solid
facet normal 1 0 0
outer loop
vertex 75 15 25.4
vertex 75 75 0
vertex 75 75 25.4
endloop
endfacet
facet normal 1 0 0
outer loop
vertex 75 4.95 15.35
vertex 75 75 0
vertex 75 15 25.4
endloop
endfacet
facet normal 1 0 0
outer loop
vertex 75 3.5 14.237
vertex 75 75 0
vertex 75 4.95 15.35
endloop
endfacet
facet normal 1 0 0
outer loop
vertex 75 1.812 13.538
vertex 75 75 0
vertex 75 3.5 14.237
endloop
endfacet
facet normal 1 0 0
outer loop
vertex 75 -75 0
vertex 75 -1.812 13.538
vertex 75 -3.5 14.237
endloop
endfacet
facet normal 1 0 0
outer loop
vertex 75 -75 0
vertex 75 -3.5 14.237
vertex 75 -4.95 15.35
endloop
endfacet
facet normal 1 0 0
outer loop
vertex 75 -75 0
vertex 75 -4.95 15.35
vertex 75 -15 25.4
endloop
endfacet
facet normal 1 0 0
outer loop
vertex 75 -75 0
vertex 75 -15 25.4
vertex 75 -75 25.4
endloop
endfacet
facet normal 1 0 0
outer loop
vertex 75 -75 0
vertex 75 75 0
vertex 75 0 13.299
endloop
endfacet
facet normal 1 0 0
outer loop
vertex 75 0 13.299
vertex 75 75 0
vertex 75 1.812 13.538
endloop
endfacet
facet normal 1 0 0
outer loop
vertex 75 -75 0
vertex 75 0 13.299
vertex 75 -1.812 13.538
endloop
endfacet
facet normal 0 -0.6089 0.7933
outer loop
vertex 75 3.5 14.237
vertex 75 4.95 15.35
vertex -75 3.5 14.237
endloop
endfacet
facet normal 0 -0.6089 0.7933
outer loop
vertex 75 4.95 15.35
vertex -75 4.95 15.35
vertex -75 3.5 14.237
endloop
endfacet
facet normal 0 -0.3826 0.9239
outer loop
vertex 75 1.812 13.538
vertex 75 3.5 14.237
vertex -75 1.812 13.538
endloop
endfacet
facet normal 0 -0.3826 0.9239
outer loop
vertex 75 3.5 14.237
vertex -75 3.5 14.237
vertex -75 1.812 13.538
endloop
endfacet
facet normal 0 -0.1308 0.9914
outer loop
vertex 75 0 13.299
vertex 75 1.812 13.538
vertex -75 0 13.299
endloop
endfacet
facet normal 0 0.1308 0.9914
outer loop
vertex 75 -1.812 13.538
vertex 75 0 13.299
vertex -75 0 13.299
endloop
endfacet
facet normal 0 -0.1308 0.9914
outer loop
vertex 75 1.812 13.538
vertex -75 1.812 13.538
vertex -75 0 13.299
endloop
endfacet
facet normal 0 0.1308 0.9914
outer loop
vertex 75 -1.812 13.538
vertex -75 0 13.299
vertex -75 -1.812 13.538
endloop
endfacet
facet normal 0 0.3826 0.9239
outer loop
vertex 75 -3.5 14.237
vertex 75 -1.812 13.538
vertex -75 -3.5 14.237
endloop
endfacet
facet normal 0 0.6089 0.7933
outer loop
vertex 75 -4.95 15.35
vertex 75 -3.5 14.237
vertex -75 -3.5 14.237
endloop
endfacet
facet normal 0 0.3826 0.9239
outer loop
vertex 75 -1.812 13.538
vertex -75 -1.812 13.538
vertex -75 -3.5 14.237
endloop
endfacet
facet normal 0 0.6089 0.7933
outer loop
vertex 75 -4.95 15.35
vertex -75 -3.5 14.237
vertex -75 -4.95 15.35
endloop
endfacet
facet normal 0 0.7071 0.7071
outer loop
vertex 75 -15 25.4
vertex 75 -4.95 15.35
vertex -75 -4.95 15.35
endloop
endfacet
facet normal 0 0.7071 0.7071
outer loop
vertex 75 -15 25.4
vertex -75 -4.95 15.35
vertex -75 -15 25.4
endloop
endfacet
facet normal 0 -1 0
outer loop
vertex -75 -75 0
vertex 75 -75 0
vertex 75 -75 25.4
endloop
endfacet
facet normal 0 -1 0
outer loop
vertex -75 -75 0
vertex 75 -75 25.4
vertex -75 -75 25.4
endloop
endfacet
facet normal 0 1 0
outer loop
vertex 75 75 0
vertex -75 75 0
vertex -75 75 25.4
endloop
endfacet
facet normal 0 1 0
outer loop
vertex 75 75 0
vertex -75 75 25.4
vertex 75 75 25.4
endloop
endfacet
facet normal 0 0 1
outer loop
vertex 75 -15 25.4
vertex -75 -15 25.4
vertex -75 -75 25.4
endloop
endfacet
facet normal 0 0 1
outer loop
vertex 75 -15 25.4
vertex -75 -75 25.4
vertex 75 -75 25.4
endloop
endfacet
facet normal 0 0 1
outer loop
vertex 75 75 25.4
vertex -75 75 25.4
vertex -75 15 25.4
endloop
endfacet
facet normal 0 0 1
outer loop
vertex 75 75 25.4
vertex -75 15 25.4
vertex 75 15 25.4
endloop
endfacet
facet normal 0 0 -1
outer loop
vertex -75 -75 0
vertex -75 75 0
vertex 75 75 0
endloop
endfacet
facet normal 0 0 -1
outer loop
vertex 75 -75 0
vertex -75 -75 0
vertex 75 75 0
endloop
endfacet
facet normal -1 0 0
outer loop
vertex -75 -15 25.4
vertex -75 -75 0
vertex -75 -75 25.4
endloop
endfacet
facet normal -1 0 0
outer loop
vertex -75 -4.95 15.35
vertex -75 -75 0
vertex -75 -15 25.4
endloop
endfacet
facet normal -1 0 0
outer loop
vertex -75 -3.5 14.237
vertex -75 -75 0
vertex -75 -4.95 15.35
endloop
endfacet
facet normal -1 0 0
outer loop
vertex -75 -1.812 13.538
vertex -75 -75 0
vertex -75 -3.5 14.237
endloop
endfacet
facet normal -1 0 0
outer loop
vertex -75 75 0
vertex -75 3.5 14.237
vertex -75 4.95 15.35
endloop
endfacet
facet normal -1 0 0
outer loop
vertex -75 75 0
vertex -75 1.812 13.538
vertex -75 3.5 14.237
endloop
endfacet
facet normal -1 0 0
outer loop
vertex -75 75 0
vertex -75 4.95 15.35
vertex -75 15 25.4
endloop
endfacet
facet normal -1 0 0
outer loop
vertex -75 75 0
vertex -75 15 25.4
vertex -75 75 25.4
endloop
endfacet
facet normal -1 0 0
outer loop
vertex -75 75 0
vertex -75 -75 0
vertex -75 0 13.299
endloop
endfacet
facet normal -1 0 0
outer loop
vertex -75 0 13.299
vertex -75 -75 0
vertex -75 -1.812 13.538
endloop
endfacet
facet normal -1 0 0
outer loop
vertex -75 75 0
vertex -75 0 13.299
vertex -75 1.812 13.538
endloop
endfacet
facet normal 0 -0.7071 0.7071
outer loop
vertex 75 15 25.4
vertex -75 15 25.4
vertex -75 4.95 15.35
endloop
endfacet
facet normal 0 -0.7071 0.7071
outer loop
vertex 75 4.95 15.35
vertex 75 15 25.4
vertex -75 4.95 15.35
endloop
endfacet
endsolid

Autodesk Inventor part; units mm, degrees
sketch "Boceto1" plane through (0, 0, 0) normal (0, 0, 1) x (1, 0, 0)
  line L0 (-75, 75) -> (75, 75)
  line L1 (75, 75) -> (75, -75)
  line L2 (75, -75) -> (-75, -75)
  line L3 (-75, -75) -> (-75, 75)
  line L4 (-75, 75) -> (75, -75) construction
  line L5 (75, 75) -> (-75, -75) construction
  point P0 (0, 0)
  dimension "d0" = 150
  dimension "d1" = 150
extrude "Extrusión1" add sketch "Boceto1" along normal blind 25.4
sketch "Boceto2" plane through (75, -75, 0) normal (1, 0, 0) x (0, 0, -1)
  line L0 (-25.4, 150) -> (-25.4, 0) projected
  line L1 (-25.4, 0) -> (-25.4, 150) projected
  line L2 (-25.4, 75) -> (-25.4, 60)
  line L3 (-25.4, 75) -> (-10.4, 75)
  line L4 (-10.4, 75) -> (-25.4, 60)
  line L5 (-25.4, 75) -> (-25.4, 90)
  line L6 (-25.4, 90) -> (-10.4, 75)
  point P0 (0, 75)
  dimension "d6" = 15
  dimension "d7" = 15
  dimension "d9" = 15
extrude "Extrusión2" cut sketch "Boceto2" against normal blind 165.25
fillet "Empalme1" radius 7 1 edges at (0, 0, 10.4)
properties part number "Placa - Grieta"
